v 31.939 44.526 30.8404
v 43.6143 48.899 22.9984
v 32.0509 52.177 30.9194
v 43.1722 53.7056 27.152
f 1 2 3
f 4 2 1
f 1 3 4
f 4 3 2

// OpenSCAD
// Auto-generated auxetic polyhedron
points = [
    [32.050916, 52.177032, 30.919442],
    [43.614350, 48.898984, 22.998366],
    [31.938997, 44.526037, 30.840435],
    [43.172173, 53.705626, 27.152013],
];

faces = [
    [0, 1, 2],
    [2, 1, 3],
    [3, 0, 2],
    [1, 0, 3],
];

polyhedron(points = points, faces = faces);
